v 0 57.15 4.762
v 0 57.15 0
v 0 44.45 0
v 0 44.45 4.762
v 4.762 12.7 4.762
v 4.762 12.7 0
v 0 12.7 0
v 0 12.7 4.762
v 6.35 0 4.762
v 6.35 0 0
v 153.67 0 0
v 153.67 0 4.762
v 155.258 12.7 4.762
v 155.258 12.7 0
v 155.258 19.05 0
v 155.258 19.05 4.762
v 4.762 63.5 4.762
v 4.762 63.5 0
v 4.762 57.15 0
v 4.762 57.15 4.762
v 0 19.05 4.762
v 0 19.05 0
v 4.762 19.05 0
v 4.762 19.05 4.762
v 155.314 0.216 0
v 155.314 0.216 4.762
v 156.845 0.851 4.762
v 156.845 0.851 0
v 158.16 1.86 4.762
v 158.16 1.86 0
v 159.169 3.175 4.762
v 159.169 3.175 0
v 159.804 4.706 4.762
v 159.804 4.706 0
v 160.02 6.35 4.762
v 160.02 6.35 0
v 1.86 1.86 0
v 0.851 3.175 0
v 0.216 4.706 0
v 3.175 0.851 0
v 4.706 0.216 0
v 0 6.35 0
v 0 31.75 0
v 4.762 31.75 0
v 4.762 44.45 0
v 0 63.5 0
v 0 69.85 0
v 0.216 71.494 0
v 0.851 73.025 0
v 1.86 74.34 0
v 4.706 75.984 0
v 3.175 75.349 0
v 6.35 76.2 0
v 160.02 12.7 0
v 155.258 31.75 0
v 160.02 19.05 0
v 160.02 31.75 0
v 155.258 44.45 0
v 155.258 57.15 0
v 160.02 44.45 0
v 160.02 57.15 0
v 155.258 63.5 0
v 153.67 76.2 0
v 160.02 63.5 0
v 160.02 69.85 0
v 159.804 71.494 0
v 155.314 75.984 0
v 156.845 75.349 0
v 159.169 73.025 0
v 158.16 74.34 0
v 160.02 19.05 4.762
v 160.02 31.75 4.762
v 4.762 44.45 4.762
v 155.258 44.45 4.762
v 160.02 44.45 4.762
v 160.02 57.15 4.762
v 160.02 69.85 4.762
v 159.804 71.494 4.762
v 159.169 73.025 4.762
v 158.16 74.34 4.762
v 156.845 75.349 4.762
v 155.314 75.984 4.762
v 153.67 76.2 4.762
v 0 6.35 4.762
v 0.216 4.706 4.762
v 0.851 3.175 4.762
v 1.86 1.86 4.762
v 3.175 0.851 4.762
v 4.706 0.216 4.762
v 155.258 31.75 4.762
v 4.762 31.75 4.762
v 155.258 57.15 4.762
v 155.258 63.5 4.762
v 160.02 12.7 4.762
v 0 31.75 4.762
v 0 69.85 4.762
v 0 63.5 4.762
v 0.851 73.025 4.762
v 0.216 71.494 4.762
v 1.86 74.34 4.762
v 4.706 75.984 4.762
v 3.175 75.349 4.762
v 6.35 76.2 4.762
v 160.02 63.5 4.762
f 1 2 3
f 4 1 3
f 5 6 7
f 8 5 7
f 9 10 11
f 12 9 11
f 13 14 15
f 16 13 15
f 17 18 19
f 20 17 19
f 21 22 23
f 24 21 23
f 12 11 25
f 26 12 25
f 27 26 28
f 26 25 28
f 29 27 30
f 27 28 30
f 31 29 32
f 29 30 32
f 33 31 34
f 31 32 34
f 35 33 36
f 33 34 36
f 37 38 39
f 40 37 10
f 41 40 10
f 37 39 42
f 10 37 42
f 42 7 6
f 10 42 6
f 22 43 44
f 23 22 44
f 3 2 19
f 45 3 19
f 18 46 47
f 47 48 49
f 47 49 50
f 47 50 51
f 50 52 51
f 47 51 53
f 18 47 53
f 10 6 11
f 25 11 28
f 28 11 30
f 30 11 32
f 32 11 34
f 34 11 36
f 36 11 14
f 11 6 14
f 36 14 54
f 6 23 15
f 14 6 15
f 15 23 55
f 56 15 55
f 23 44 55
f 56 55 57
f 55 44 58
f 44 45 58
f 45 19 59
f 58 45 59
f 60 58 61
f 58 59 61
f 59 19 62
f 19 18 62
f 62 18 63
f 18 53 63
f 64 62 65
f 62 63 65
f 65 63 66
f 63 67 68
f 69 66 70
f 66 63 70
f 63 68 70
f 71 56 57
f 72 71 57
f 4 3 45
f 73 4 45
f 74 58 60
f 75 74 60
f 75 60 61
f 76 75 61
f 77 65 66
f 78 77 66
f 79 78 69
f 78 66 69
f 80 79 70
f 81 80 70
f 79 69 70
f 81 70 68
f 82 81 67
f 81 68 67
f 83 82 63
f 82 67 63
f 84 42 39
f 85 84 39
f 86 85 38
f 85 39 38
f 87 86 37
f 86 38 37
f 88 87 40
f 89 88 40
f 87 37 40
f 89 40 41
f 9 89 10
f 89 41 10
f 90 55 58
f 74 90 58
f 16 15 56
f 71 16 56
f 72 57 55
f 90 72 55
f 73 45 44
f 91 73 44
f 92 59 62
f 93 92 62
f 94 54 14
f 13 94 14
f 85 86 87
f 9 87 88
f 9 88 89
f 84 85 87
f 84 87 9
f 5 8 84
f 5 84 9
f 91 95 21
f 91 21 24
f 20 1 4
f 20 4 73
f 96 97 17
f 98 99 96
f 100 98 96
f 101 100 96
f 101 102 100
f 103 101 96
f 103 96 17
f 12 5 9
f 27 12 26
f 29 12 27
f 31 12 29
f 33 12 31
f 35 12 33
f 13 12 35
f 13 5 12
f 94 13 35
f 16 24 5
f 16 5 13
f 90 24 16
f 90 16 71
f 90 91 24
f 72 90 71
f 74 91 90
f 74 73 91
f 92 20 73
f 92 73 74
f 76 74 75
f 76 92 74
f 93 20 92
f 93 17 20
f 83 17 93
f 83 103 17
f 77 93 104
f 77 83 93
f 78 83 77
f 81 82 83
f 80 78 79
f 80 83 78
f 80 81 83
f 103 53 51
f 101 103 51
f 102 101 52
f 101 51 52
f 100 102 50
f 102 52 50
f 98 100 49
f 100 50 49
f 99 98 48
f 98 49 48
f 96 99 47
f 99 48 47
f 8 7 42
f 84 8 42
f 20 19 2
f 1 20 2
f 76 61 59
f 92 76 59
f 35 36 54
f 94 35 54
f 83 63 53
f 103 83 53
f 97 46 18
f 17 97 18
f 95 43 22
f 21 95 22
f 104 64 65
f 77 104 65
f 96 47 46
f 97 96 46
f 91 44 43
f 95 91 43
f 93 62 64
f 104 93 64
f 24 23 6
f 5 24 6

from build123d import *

# Parameters (mm, degrees)
F1_DEPTH = 4.7625


# Not quite as in the source:
# - a length typed as a fraction of an inch, garbled in the dataset ("3 / 203.2 mm" for 3/8 in), is restored
# - a feature names something its author has since deleted; it is built from what else it names


with BuildPart() as f1:
    # F0 (on Top) → F1 (new body)
    with BuildSketch(Plane.XY):
        with BuildLine():
            ThreePointArc((0, 6.35), (1.8598719395, 1.8598719395), (6.35, 0))
            Line((6.35, 0), (80.01, 0))
            Line((80.01, 0), (153.67, 0))
            ThreePointArc((153.67, 0), (158.1601280605, 1.8598719395), (160.02, 6.35))
            Line((160.02, 6.35), (160.02, 12.7))
            Line((160.02, 12.7), (155.2575, 12.7))
            Line((155.2575, 12.7), (155.2575, 19.05))
            Line((155.2575, 19.05), (160.02, 19.05))
            Line((160.02, 19.05), (160.02, 31.75))
            Line((160.02, 31.75), (155.2575, 31.75))
            Line((155.2575, 31.75), (155.2575, 44.45))
            Line((155.2575, 44.45), (160.02, 44.45))
            Line((160.02, 44.45), (160.02, 57.15))
            Line((160.02, 57.15), (155.2575, 57.15))
            Line((155.2575, 57.15), (155.2575, 63.5))
            Line((155.2575, 63.5), (160.02, 63.5))
            Line((160.02, 63.5), (160.02, 69.85))
            ThreePointArc((160.02, 69.85), (158.1601280605, 74.3401280605), (153.67, 76.2))
            Line((153.67, 76.2), (80.01, 76.2))
            Line((80.01, 76.2), (6.35, 76.2))
            ThreePointArc((6.35, 76.2), (1.8598719395, 74.3401280605), (0, 69.85))
            Line((0, 69.85), (0, 63.5))
            Line((0, 63.5), (4.7625, 63.5))
            Line((4.7625, 63.5), (4.7625, 57.15))
            Line((4.7625, 57.15), (0, 57.15))
            Line((0, 57.15), (0, 44.45))
            Line((0, 44.45), (4.7625, 44.45))
            Line((4.7625, 44.45), (4.7625, 31.75))
            Line((4.7625, 31.75), (0, 31.75))
            Line((0, 31.75), (0, 19.05))
            Line((0, 19.05), (4.7625, 19.05))
            Line((4.7625, 19.05), (4.7625, 12.7))
            Line((4.7625, 12.7), (0, 12.7))
            Line((0, 12.7), (0, 6.35))
        make_face()
    extrude(amount=F1_DEPTH)


solid = f1.part
